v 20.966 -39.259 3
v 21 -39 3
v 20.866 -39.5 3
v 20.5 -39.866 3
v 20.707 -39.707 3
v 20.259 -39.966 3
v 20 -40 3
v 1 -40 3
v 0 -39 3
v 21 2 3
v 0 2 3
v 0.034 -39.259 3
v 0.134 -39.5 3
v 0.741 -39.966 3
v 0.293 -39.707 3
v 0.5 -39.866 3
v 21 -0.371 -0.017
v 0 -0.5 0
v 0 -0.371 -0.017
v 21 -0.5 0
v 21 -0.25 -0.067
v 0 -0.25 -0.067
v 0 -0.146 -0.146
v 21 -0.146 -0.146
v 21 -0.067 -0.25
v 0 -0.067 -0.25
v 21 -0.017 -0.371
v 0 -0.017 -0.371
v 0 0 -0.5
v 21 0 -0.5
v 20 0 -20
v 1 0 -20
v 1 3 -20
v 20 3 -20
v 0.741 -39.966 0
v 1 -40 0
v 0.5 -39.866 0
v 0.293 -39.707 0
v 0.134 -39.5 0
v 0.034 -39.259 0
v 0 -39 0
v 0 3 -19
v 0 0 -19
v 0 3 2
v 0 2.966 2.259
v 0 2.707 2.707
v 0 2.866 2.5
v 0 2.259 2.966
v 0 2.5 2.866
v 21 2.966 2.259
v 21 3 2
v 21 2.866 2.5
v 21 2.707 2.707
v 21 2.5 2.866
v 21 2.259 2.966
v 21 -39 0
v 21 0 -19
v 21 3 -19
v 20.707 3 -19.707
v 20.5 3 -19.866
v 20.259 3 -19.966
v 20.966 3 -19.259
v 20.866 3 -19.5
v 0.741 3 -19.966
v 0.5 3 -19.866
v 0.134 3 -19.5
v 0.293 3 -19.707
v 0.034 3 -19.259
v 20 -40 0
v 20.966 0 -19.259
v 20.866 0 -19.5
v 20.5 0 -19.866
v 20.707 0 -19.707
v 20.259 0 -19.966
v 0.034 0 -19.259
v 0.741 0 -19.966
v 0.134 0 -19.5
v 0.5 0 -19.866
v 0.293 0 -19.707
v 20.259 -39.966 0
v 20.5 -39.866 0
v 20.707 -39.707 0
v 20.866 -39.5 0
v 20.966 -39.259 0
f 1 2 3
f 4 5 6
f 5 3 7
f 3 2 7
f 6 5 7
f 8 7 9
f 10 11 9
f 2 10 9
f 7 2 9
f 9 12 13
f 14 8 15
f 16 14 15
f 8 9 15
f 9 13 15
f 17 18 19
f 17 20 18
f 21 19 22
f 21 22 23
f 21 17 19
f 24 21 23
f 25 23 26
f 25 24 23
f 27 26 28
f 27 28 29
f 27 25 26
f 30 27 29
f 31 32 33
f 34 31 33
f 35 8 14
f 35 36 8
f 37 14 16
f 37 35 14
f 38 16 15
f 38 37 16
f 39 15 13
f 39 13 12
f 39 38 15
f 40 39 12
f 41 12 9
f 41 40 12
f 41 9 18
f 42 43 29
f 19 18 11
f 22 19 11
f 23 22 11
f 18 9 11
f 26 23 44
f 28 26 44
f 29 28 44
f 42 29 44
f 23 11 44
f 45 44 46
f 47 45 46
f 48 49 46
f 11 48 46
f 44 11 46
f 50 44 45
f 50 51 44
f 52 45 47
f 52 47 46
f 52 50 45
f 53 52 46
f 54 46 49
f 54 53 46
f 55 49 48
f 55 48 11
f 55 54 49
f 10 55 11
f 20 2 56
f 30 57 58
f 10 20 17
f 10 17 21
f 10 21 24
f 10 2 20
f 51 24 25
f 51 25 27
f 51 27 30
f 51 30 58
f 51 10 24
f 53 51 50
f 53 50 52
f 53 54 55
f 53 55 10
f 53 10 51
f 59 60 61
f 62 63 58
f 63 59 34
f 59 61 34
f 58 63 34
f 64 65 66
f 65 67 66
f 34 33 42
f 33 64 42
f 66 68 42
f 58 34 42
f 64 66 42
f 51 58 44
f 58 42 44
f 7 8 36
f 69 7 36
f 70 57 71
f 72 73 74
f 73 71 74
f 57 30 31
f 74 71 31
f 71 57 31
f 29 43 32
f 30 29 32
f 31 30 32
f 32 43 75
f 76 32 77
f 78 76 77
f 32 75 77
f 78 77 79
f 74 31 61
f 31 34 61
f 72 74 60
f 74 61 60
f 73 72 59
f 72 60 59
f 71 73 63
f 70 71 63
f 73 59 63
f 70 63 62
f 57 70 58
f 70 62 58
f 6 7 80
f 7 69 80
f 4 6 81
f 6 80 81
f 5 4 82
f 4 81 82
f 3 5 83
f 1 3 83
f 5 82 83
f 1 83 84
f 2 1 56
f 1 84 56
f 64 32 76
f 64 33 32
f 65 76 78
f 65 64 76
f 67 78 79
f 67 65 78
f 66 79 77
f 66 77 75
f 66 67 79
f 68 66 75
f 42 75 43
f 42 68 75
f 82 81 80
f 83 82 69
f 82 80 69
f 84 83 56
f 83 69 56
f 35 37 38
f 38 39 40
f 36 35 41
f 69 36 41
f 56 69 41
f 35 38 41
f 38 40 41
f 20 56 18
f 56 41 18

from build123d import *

# Parameters (mm, degrees)
F1_DEPTH = 21
F2_R     = 1
F3_R     = 0.5


with BuildPart() as f1:
    # F0 (on Right) → F1 (new body)
    with BuildSketch(Plane.YZ):
        Polygon((-40, 3), (-40, 0), (0, 0), (0, -20), (3, -20), (3, 3), align=None)
    extrude(amount=F1_DEPTH)

    # F2
    f2_edges = [f1.edges().sort_by_distance(p)[0] for p in [
        (10.5, 3, 3),
        (21, -40, 1.5),
        (0, -40, 1.5),
        (21, 1.5, -20),
        (0, 1.5, -20),
    ]]
    fillet(f2_edges, radius=F2_R)

    # F3
    f3_edges = [f1.edges().sort_by_distance(p)[0] for p in [
        (10.5, 0, 0),
    ]]
    fillet(f3_edges, radius=F3_R)


solid = f1.part
